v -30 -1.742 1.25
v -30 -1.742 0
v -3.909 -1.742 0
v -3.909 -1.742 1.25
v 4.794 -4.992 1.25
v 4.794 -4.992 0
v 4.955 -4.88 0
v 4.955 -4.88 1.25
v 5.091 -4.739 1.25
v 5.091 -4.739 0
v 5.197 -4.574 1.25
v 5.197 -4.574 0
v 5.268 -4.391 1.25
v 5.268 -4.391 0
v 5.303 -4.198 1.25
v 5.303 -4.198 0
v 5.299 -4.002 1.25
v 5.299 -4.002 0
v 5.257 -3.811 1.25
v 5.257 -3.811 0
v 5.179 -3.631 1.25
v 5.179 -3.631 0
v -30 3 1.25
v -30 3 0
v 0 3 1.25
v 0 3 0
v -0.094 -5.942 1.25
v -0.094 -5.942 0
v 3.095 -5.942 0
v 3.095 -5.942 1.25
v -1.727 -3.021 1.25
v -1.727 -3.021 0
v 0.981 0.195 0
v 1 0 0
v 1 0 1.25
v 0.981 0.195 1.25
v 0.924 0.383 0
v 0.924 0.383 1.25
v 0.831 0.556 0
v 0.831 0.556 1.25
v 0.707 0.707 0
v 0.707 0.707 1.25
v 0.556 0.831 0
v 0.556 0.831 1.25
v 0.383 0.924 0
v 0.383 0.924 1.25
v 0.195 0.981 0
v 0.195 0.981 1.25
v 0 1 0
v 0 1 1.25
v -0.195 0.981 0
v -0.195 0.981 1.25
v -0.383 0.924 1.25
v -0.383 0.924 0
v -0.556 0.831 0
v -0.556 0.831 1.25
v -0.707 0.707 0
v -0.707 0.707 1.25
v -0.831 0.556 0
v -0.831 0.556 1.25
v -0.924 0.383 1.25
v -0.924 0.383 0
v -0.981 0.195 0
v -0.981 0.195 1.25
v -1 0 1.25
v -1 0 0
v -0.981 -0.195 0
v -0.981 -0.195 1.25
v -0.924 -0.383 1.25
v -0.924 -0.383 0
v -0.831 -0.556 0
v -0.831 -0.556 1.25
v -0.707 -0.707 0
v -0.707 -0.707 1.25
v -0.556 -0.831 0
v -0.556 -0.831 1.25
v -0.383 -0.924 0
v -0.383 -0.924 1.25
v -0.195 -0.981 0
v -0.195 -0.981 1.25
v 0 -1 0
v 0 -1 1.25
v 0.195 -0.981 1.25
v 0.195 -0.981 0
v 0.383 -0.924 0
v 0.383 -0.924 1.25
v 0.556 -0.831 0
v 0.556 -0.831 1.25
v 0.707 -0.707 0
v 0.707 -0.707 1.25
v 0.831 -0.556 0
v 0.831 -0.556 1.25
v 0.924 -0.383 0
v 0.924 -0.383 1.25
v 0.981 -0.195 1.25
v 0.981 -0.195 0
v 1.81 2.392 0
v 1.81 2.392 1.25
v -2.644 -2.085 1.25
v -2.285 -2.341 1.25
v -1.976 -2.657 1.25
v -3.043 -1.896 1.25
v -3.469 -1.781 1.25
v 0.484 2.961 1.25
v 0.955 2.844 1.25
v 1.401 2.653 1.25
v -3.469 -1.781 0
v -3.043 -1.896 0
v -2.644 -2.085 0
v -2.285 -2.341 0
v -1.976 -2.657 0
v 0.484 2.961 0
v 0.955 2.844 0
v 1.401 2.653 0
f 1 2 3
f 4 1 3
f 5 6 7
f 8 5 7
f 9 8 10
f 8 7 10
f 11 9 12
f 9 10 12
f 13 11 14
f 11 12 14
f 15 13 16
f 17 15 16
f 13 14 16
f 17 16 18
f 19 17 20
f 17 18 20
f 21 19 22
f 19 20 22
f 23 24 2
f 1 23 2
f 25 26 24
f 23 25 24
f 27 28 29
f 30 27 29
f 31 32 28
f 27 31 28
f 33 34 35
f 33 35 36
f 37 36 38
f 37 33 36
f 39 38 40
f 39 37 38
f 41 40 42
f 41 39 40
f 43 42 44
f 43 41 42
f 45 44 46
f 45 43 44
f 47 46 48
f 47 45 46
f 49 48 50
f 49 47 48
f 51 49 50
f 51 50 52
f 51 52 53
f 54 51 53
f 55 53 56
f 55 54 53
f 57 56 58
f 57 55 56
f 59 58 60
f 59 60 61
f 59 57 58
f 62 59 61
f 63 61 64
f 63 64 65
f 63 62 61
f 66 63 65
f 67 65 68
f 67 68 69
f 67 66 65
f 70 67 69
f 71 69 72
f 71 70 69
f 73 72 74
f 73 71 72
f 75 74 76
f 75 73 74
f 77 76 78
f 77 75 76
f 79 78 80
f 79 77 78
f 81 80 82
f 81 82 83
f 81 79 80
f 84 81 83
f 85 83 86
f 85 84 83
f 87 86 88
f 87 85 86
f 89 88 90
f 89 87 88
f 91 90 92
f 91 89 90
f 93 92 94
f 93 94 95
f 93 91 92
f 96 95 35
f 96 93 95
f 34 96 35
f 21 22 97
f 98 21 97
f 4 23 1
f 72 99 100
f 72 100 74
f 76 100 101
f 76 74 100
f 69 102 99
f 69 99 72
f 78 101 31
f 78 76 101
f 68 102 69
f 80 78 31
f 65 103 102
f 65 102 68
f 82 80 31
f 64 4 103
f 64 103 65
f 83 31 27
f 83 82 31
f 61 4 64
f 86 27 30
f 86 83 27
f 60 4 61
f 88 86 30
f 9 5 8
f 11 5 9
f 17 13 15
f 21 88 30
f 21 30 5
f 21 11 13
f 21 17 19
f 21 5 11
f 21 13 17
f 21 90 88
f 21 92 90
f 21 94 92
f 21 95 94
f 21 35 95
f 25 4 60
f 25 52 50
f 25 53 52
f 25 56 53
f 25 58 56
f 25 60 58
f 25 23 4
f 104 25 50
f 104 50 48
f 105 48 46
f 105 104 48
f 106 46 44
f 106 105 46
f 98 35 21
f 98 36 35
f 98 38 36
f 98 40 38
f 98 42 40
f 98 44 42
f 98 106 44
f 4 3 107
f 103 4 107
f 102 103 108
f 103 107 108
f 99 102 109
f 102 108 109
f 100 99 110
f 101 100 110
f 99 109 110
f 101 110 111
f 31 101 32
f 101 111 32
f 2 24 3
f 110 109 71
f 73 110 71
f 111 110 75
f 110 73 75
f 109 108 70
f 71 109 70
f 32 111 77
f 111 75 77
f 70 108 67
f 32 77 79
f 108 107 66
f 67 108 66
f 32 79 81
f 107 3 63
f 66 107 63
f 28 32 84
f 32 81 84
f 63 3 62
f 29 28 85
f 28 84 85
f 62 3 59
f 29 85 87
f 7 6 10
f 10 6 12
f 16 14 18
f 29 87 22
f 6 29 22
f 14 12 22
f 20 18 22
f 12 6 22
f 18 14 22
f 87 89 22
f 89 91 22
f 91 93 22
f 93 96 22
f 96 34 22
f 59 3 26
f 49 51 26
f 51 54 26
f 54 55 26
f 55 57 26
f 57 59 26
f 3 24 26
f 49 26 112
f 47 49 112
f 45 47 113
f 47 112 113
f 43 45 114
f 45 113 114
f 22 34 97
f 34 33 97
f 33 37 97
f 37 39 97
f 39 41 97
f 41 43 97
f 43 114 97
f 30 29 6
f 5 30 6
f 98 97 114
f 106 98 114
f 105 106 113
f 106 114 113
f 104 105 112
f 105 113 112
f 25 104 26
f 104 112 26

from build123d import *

# Parameters (mm, degrees)
F0_R     = 1
F1_DEPTH = 1.25


with BuildPart() as f1:
    # F0 (on Top) → F1 (new body)
    with BuildSketch(Plane.XY):
        with BuildLine():
            Line((5.178727, -3.631317), (1.810287, 2.39225))
            ThreePointArc((1.810287, 2.39225), (0.95479, 2.844007), (0, 3))
            Line((0, 3), (-30, 3))
            Line((-30, 3), (-30, -1.74156))
            Line((-30, -1.74156), (-3.909058, -1.74156))
            ThreePointArc((-3.909058, -1.74156), (-2.644244, -2.085117), (-1.727059, -3.021363))
            Line((-1.727059, -3.021363), (-0.093587, -5.942397))
            Line((-0.093587, -5.942397), (3.094821, -5.942397))
            Line((3.094821, -5.942397), (4.794006, -4.992196))
            ThreePointArc((4.794006, -4.992196), (5.268214, -4.391435), (5.178727, -3.631317))
        make_face()
        Circle(F0_R, mode=Mode.SUBTRACT)
    extrude(amount=F1_DEPTH)


solid = f1.part
